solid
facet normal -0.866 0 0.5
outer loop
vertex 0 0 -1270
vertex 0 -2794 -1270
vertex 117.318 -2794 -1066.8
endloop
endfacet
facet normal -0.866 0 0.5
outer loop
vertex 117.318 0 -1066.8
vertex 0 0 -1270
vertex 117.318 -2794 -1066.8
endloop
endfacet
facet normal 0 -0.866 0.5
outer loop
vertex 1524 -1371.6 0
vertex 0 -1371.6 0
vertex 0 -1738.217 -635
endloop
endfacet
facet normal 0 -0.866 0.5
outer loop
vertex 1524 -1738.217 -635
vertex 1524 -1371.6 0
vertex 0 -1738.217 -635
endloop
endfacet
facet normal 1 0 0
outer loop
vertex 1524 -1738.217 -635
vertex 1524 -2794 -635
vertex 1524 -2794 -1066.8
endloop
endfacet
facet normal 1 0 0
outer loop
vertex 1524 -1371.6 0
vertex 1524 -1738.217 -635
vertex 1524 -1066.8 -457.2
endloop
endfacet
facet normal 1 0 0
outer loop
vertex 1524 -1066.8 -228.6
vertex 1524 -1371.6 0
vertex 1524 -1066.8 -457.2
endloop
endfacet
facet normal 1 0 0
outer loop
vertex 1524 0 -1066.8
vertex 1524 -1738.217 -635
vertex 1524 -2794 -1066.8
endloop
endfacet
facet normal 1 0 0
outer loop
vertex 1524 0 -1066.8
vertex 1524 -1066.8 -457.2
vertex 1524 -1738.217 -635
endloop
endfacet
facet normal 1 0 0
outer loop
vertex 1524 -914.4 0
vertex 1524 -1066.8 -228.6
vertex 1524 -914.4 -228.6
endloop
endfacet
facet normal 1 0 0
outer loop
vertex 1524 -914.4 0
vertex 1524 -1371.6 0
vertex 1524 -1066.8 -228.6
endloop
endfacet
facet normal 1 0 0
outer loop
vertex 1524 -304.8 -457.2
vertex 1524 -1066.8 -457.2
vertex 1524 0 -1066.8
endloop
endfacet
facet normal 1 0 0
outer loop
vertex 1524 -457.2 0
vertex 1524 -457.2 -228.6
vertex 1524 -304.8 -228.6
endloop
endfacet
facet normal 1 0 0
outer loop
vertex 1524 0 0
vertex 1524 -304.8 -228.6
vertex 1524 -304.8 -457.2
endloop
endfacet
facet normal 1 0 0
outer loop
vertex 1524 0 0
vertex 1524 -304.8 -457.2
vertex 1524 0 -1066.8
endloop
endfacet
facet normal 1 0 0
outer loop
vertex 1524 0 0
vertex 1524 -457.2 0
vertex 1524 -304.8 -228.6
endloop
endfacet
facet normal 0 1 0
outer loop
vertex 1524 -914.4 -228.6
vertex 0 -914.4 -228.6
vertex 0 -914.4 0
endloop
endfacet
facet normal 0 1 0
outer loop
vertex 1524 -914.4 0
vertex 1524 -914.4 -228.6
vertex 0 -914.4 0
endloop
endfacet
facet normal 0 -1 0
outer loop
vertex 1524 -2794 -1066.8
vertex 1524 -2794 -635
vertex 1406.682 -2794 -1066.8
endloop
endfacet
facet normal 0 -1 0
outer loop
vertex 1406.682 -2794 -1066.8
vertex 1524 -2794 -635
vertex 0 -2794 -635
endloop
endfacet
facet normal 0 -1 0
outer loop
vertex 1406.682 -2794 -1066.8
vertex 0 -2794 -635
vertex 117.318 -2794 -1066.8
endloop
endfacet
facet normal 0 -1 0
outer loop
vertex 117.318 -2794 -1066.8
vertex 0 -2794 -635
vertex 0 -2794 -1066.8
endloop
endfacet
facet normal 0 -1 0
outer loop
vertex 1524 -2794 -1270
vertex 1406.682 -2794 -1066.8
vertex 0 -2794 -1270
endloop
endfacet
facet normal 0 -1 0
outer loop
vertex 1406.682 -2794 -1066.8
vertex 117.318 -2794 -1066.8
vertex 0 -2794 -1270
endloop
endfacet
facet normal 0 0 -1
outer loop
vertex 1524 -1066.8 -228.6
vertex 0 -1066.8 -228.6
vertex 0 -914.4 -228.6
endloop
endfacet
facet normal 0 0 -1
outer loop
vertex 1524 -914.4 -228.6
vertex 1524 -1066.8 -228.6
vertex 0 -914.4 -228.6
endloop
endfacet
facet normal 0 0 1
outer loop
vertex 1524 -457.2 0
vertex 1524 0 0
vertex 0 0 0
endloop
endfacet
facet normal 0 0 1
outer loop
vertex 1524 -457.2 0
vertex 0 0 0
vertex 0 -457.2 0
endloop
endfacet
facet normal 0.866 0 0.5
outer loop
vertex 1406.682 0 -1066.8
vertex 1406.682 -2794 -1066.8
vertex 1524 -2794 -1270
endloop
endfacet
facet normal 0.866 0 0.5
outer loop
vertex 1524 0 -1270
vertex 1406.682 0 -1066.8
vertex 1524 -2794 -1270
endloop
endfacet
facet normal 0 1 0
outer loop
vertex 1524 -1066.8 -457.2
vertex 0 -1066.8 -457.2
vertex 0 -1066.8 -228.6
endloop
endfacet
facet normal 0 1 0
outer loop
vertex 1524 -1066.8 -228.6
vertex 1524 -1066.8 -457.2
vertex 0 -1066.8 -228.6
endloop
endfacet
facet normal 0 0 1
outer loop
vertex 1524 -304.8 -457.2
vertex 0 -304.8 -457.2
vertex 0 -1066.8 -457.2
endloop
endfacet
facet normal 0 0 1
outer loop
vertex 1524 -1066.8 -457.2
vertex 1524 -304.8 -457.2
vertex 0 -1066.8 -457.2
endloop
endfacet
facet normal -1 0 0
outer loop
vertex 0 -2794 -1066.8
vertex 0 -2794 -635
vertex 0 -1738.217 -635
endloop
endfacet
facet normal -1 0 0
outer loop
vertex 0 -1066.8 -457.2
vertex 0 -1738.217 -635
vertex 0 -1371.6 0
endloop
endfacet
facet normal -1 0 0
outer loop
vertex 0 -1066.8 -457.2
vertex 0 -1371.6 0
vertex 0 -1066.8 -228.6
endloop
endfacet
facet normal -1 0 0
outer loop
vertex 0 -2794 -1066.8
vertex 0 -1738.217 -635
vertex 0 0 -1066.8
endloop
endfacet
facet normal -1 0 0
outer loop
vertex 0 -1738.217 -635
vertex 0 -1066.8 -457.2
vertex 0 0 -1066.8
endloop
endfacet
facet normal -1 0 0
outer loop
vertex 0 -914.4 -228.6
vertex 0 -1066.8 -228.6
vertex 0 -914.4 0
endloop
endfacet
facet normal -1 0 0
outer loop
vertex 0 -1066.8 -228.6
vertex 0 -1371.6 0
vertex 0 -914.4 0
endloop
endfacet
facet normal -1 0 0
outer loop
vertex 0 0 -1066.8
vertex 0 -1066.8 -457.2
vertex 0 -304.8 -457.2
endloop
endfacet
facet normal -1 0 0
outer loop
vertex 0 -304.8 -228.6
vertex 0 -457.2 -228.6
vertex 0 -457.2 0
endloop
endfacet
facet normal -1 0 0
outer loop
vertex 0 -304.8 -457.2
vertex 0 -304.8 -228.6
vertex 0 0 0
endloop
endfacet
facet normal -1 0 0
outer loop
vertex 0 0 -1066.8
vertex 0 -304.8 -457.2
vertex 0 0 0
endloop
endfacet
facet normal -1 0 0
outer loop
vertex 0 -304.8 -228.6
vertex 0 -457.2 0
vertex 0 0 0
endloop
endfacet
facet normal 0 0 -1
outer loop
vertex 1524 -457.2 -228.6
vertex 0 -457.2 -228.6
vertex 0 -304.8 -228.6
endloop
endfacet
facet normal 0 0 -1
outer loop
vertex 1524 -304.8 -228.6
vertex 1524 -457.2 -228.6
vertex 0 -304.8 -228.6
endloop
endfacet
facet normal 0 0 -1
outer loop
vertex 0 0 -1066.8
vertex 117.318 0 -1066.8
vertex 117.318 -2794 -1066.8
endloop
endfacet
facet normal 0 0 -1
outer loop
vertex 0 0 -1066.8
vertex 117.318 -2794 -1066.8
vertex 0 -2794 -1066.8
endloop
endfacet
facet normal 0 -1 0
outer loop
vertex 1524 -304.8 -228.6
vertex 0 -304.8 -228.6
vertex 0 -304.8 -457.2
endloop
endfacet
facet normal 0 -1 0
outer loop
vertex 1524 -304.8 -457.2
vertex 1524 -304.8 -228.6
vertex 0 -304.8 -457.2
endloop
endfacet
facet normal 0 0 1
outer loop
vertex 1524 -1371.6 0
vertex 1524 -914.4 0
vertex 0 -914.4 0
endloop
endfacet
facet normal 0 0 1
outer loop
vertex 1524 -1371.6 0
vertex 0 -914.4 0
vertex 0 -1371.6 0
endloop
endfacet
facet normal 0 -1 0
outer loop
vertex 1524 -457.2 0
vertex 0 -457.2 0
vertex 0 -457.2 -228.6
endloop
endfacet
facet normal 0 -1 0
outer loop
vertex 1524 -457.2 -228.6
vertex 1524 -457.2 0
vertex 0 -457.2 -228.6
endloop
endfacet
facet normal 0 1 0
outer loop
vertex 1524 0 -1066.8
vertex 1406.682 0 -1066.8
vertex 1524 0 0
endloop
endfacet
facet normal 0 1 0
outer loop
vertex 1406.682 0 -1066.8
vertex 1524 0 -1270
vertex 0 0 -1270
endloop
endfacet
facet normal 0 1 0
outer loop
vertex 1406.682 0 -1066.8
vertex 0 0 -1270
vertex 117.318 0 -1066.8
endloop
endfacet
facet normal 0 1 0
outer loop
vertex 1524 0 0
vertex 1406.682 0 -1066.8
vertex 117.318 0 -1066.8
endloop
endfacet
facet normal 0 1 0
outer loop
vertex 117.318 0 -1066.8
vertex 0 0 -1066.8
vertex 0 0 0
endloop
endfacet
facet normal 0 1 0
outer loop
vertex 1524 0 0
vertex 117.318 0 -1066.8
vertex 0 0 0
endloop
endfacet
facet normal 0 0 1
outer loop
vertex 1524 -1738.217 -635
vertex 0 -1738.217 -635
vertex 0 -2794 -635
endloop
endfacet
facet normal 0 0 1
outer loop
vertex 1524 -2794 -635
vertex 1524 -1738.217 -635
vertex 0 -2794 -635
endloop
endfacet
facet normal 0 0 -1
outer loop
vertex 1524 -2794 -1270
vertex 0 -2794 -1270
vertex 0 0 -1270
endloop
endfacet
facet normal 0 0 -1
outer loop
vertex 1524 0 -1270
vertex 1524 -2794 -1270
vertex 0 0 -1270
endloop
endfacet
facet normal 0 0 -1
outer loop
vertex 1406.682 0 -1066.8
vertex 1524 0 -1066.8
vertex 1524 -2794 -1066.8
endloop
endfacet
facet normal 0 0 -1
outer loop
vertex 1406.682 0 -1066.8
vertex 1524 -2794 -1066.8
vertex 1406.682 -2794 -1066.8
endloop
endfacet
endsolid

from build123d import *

# Parameters (mm, degrees)
F1_DEPTH = 1524
F3_DEPTH = 2794.001


with BuildPart() as f1:
    # F0 (on Right) → F1 (new body)
    with BuildSketch(Plane.YZ):
        Polygon((0, -1270), (0, 0), (-457.2, 0), (-457.2, -228.6), (-304.8, -228.6), (-304.8, -457.2), (-1066.8, -457.2), (-1066.8, -228.6), (-914.4, -228.6), (-914.4, 0), (-1371.6, 0), (-1738.217421, -635), (-2794, -635), (-2794, -1270), align=None)
    extrude(amount=F1_DEPTH)

    # F2 (on face) → F3 (cut, through all)
    with BuildSketch(Plane.XZ.offset(2794)):
        Polygon((0, -1066.8), (0, -1270), (117.317575, -1066.8), align=None)
        Polygon((1406.682425, -1066.8), (1524, -1270), (1524, -1066.8), align=None)
    extrude(amount=-F3_DEPTH, mode=Mode.SUBTRACT)


solid = f1.part
